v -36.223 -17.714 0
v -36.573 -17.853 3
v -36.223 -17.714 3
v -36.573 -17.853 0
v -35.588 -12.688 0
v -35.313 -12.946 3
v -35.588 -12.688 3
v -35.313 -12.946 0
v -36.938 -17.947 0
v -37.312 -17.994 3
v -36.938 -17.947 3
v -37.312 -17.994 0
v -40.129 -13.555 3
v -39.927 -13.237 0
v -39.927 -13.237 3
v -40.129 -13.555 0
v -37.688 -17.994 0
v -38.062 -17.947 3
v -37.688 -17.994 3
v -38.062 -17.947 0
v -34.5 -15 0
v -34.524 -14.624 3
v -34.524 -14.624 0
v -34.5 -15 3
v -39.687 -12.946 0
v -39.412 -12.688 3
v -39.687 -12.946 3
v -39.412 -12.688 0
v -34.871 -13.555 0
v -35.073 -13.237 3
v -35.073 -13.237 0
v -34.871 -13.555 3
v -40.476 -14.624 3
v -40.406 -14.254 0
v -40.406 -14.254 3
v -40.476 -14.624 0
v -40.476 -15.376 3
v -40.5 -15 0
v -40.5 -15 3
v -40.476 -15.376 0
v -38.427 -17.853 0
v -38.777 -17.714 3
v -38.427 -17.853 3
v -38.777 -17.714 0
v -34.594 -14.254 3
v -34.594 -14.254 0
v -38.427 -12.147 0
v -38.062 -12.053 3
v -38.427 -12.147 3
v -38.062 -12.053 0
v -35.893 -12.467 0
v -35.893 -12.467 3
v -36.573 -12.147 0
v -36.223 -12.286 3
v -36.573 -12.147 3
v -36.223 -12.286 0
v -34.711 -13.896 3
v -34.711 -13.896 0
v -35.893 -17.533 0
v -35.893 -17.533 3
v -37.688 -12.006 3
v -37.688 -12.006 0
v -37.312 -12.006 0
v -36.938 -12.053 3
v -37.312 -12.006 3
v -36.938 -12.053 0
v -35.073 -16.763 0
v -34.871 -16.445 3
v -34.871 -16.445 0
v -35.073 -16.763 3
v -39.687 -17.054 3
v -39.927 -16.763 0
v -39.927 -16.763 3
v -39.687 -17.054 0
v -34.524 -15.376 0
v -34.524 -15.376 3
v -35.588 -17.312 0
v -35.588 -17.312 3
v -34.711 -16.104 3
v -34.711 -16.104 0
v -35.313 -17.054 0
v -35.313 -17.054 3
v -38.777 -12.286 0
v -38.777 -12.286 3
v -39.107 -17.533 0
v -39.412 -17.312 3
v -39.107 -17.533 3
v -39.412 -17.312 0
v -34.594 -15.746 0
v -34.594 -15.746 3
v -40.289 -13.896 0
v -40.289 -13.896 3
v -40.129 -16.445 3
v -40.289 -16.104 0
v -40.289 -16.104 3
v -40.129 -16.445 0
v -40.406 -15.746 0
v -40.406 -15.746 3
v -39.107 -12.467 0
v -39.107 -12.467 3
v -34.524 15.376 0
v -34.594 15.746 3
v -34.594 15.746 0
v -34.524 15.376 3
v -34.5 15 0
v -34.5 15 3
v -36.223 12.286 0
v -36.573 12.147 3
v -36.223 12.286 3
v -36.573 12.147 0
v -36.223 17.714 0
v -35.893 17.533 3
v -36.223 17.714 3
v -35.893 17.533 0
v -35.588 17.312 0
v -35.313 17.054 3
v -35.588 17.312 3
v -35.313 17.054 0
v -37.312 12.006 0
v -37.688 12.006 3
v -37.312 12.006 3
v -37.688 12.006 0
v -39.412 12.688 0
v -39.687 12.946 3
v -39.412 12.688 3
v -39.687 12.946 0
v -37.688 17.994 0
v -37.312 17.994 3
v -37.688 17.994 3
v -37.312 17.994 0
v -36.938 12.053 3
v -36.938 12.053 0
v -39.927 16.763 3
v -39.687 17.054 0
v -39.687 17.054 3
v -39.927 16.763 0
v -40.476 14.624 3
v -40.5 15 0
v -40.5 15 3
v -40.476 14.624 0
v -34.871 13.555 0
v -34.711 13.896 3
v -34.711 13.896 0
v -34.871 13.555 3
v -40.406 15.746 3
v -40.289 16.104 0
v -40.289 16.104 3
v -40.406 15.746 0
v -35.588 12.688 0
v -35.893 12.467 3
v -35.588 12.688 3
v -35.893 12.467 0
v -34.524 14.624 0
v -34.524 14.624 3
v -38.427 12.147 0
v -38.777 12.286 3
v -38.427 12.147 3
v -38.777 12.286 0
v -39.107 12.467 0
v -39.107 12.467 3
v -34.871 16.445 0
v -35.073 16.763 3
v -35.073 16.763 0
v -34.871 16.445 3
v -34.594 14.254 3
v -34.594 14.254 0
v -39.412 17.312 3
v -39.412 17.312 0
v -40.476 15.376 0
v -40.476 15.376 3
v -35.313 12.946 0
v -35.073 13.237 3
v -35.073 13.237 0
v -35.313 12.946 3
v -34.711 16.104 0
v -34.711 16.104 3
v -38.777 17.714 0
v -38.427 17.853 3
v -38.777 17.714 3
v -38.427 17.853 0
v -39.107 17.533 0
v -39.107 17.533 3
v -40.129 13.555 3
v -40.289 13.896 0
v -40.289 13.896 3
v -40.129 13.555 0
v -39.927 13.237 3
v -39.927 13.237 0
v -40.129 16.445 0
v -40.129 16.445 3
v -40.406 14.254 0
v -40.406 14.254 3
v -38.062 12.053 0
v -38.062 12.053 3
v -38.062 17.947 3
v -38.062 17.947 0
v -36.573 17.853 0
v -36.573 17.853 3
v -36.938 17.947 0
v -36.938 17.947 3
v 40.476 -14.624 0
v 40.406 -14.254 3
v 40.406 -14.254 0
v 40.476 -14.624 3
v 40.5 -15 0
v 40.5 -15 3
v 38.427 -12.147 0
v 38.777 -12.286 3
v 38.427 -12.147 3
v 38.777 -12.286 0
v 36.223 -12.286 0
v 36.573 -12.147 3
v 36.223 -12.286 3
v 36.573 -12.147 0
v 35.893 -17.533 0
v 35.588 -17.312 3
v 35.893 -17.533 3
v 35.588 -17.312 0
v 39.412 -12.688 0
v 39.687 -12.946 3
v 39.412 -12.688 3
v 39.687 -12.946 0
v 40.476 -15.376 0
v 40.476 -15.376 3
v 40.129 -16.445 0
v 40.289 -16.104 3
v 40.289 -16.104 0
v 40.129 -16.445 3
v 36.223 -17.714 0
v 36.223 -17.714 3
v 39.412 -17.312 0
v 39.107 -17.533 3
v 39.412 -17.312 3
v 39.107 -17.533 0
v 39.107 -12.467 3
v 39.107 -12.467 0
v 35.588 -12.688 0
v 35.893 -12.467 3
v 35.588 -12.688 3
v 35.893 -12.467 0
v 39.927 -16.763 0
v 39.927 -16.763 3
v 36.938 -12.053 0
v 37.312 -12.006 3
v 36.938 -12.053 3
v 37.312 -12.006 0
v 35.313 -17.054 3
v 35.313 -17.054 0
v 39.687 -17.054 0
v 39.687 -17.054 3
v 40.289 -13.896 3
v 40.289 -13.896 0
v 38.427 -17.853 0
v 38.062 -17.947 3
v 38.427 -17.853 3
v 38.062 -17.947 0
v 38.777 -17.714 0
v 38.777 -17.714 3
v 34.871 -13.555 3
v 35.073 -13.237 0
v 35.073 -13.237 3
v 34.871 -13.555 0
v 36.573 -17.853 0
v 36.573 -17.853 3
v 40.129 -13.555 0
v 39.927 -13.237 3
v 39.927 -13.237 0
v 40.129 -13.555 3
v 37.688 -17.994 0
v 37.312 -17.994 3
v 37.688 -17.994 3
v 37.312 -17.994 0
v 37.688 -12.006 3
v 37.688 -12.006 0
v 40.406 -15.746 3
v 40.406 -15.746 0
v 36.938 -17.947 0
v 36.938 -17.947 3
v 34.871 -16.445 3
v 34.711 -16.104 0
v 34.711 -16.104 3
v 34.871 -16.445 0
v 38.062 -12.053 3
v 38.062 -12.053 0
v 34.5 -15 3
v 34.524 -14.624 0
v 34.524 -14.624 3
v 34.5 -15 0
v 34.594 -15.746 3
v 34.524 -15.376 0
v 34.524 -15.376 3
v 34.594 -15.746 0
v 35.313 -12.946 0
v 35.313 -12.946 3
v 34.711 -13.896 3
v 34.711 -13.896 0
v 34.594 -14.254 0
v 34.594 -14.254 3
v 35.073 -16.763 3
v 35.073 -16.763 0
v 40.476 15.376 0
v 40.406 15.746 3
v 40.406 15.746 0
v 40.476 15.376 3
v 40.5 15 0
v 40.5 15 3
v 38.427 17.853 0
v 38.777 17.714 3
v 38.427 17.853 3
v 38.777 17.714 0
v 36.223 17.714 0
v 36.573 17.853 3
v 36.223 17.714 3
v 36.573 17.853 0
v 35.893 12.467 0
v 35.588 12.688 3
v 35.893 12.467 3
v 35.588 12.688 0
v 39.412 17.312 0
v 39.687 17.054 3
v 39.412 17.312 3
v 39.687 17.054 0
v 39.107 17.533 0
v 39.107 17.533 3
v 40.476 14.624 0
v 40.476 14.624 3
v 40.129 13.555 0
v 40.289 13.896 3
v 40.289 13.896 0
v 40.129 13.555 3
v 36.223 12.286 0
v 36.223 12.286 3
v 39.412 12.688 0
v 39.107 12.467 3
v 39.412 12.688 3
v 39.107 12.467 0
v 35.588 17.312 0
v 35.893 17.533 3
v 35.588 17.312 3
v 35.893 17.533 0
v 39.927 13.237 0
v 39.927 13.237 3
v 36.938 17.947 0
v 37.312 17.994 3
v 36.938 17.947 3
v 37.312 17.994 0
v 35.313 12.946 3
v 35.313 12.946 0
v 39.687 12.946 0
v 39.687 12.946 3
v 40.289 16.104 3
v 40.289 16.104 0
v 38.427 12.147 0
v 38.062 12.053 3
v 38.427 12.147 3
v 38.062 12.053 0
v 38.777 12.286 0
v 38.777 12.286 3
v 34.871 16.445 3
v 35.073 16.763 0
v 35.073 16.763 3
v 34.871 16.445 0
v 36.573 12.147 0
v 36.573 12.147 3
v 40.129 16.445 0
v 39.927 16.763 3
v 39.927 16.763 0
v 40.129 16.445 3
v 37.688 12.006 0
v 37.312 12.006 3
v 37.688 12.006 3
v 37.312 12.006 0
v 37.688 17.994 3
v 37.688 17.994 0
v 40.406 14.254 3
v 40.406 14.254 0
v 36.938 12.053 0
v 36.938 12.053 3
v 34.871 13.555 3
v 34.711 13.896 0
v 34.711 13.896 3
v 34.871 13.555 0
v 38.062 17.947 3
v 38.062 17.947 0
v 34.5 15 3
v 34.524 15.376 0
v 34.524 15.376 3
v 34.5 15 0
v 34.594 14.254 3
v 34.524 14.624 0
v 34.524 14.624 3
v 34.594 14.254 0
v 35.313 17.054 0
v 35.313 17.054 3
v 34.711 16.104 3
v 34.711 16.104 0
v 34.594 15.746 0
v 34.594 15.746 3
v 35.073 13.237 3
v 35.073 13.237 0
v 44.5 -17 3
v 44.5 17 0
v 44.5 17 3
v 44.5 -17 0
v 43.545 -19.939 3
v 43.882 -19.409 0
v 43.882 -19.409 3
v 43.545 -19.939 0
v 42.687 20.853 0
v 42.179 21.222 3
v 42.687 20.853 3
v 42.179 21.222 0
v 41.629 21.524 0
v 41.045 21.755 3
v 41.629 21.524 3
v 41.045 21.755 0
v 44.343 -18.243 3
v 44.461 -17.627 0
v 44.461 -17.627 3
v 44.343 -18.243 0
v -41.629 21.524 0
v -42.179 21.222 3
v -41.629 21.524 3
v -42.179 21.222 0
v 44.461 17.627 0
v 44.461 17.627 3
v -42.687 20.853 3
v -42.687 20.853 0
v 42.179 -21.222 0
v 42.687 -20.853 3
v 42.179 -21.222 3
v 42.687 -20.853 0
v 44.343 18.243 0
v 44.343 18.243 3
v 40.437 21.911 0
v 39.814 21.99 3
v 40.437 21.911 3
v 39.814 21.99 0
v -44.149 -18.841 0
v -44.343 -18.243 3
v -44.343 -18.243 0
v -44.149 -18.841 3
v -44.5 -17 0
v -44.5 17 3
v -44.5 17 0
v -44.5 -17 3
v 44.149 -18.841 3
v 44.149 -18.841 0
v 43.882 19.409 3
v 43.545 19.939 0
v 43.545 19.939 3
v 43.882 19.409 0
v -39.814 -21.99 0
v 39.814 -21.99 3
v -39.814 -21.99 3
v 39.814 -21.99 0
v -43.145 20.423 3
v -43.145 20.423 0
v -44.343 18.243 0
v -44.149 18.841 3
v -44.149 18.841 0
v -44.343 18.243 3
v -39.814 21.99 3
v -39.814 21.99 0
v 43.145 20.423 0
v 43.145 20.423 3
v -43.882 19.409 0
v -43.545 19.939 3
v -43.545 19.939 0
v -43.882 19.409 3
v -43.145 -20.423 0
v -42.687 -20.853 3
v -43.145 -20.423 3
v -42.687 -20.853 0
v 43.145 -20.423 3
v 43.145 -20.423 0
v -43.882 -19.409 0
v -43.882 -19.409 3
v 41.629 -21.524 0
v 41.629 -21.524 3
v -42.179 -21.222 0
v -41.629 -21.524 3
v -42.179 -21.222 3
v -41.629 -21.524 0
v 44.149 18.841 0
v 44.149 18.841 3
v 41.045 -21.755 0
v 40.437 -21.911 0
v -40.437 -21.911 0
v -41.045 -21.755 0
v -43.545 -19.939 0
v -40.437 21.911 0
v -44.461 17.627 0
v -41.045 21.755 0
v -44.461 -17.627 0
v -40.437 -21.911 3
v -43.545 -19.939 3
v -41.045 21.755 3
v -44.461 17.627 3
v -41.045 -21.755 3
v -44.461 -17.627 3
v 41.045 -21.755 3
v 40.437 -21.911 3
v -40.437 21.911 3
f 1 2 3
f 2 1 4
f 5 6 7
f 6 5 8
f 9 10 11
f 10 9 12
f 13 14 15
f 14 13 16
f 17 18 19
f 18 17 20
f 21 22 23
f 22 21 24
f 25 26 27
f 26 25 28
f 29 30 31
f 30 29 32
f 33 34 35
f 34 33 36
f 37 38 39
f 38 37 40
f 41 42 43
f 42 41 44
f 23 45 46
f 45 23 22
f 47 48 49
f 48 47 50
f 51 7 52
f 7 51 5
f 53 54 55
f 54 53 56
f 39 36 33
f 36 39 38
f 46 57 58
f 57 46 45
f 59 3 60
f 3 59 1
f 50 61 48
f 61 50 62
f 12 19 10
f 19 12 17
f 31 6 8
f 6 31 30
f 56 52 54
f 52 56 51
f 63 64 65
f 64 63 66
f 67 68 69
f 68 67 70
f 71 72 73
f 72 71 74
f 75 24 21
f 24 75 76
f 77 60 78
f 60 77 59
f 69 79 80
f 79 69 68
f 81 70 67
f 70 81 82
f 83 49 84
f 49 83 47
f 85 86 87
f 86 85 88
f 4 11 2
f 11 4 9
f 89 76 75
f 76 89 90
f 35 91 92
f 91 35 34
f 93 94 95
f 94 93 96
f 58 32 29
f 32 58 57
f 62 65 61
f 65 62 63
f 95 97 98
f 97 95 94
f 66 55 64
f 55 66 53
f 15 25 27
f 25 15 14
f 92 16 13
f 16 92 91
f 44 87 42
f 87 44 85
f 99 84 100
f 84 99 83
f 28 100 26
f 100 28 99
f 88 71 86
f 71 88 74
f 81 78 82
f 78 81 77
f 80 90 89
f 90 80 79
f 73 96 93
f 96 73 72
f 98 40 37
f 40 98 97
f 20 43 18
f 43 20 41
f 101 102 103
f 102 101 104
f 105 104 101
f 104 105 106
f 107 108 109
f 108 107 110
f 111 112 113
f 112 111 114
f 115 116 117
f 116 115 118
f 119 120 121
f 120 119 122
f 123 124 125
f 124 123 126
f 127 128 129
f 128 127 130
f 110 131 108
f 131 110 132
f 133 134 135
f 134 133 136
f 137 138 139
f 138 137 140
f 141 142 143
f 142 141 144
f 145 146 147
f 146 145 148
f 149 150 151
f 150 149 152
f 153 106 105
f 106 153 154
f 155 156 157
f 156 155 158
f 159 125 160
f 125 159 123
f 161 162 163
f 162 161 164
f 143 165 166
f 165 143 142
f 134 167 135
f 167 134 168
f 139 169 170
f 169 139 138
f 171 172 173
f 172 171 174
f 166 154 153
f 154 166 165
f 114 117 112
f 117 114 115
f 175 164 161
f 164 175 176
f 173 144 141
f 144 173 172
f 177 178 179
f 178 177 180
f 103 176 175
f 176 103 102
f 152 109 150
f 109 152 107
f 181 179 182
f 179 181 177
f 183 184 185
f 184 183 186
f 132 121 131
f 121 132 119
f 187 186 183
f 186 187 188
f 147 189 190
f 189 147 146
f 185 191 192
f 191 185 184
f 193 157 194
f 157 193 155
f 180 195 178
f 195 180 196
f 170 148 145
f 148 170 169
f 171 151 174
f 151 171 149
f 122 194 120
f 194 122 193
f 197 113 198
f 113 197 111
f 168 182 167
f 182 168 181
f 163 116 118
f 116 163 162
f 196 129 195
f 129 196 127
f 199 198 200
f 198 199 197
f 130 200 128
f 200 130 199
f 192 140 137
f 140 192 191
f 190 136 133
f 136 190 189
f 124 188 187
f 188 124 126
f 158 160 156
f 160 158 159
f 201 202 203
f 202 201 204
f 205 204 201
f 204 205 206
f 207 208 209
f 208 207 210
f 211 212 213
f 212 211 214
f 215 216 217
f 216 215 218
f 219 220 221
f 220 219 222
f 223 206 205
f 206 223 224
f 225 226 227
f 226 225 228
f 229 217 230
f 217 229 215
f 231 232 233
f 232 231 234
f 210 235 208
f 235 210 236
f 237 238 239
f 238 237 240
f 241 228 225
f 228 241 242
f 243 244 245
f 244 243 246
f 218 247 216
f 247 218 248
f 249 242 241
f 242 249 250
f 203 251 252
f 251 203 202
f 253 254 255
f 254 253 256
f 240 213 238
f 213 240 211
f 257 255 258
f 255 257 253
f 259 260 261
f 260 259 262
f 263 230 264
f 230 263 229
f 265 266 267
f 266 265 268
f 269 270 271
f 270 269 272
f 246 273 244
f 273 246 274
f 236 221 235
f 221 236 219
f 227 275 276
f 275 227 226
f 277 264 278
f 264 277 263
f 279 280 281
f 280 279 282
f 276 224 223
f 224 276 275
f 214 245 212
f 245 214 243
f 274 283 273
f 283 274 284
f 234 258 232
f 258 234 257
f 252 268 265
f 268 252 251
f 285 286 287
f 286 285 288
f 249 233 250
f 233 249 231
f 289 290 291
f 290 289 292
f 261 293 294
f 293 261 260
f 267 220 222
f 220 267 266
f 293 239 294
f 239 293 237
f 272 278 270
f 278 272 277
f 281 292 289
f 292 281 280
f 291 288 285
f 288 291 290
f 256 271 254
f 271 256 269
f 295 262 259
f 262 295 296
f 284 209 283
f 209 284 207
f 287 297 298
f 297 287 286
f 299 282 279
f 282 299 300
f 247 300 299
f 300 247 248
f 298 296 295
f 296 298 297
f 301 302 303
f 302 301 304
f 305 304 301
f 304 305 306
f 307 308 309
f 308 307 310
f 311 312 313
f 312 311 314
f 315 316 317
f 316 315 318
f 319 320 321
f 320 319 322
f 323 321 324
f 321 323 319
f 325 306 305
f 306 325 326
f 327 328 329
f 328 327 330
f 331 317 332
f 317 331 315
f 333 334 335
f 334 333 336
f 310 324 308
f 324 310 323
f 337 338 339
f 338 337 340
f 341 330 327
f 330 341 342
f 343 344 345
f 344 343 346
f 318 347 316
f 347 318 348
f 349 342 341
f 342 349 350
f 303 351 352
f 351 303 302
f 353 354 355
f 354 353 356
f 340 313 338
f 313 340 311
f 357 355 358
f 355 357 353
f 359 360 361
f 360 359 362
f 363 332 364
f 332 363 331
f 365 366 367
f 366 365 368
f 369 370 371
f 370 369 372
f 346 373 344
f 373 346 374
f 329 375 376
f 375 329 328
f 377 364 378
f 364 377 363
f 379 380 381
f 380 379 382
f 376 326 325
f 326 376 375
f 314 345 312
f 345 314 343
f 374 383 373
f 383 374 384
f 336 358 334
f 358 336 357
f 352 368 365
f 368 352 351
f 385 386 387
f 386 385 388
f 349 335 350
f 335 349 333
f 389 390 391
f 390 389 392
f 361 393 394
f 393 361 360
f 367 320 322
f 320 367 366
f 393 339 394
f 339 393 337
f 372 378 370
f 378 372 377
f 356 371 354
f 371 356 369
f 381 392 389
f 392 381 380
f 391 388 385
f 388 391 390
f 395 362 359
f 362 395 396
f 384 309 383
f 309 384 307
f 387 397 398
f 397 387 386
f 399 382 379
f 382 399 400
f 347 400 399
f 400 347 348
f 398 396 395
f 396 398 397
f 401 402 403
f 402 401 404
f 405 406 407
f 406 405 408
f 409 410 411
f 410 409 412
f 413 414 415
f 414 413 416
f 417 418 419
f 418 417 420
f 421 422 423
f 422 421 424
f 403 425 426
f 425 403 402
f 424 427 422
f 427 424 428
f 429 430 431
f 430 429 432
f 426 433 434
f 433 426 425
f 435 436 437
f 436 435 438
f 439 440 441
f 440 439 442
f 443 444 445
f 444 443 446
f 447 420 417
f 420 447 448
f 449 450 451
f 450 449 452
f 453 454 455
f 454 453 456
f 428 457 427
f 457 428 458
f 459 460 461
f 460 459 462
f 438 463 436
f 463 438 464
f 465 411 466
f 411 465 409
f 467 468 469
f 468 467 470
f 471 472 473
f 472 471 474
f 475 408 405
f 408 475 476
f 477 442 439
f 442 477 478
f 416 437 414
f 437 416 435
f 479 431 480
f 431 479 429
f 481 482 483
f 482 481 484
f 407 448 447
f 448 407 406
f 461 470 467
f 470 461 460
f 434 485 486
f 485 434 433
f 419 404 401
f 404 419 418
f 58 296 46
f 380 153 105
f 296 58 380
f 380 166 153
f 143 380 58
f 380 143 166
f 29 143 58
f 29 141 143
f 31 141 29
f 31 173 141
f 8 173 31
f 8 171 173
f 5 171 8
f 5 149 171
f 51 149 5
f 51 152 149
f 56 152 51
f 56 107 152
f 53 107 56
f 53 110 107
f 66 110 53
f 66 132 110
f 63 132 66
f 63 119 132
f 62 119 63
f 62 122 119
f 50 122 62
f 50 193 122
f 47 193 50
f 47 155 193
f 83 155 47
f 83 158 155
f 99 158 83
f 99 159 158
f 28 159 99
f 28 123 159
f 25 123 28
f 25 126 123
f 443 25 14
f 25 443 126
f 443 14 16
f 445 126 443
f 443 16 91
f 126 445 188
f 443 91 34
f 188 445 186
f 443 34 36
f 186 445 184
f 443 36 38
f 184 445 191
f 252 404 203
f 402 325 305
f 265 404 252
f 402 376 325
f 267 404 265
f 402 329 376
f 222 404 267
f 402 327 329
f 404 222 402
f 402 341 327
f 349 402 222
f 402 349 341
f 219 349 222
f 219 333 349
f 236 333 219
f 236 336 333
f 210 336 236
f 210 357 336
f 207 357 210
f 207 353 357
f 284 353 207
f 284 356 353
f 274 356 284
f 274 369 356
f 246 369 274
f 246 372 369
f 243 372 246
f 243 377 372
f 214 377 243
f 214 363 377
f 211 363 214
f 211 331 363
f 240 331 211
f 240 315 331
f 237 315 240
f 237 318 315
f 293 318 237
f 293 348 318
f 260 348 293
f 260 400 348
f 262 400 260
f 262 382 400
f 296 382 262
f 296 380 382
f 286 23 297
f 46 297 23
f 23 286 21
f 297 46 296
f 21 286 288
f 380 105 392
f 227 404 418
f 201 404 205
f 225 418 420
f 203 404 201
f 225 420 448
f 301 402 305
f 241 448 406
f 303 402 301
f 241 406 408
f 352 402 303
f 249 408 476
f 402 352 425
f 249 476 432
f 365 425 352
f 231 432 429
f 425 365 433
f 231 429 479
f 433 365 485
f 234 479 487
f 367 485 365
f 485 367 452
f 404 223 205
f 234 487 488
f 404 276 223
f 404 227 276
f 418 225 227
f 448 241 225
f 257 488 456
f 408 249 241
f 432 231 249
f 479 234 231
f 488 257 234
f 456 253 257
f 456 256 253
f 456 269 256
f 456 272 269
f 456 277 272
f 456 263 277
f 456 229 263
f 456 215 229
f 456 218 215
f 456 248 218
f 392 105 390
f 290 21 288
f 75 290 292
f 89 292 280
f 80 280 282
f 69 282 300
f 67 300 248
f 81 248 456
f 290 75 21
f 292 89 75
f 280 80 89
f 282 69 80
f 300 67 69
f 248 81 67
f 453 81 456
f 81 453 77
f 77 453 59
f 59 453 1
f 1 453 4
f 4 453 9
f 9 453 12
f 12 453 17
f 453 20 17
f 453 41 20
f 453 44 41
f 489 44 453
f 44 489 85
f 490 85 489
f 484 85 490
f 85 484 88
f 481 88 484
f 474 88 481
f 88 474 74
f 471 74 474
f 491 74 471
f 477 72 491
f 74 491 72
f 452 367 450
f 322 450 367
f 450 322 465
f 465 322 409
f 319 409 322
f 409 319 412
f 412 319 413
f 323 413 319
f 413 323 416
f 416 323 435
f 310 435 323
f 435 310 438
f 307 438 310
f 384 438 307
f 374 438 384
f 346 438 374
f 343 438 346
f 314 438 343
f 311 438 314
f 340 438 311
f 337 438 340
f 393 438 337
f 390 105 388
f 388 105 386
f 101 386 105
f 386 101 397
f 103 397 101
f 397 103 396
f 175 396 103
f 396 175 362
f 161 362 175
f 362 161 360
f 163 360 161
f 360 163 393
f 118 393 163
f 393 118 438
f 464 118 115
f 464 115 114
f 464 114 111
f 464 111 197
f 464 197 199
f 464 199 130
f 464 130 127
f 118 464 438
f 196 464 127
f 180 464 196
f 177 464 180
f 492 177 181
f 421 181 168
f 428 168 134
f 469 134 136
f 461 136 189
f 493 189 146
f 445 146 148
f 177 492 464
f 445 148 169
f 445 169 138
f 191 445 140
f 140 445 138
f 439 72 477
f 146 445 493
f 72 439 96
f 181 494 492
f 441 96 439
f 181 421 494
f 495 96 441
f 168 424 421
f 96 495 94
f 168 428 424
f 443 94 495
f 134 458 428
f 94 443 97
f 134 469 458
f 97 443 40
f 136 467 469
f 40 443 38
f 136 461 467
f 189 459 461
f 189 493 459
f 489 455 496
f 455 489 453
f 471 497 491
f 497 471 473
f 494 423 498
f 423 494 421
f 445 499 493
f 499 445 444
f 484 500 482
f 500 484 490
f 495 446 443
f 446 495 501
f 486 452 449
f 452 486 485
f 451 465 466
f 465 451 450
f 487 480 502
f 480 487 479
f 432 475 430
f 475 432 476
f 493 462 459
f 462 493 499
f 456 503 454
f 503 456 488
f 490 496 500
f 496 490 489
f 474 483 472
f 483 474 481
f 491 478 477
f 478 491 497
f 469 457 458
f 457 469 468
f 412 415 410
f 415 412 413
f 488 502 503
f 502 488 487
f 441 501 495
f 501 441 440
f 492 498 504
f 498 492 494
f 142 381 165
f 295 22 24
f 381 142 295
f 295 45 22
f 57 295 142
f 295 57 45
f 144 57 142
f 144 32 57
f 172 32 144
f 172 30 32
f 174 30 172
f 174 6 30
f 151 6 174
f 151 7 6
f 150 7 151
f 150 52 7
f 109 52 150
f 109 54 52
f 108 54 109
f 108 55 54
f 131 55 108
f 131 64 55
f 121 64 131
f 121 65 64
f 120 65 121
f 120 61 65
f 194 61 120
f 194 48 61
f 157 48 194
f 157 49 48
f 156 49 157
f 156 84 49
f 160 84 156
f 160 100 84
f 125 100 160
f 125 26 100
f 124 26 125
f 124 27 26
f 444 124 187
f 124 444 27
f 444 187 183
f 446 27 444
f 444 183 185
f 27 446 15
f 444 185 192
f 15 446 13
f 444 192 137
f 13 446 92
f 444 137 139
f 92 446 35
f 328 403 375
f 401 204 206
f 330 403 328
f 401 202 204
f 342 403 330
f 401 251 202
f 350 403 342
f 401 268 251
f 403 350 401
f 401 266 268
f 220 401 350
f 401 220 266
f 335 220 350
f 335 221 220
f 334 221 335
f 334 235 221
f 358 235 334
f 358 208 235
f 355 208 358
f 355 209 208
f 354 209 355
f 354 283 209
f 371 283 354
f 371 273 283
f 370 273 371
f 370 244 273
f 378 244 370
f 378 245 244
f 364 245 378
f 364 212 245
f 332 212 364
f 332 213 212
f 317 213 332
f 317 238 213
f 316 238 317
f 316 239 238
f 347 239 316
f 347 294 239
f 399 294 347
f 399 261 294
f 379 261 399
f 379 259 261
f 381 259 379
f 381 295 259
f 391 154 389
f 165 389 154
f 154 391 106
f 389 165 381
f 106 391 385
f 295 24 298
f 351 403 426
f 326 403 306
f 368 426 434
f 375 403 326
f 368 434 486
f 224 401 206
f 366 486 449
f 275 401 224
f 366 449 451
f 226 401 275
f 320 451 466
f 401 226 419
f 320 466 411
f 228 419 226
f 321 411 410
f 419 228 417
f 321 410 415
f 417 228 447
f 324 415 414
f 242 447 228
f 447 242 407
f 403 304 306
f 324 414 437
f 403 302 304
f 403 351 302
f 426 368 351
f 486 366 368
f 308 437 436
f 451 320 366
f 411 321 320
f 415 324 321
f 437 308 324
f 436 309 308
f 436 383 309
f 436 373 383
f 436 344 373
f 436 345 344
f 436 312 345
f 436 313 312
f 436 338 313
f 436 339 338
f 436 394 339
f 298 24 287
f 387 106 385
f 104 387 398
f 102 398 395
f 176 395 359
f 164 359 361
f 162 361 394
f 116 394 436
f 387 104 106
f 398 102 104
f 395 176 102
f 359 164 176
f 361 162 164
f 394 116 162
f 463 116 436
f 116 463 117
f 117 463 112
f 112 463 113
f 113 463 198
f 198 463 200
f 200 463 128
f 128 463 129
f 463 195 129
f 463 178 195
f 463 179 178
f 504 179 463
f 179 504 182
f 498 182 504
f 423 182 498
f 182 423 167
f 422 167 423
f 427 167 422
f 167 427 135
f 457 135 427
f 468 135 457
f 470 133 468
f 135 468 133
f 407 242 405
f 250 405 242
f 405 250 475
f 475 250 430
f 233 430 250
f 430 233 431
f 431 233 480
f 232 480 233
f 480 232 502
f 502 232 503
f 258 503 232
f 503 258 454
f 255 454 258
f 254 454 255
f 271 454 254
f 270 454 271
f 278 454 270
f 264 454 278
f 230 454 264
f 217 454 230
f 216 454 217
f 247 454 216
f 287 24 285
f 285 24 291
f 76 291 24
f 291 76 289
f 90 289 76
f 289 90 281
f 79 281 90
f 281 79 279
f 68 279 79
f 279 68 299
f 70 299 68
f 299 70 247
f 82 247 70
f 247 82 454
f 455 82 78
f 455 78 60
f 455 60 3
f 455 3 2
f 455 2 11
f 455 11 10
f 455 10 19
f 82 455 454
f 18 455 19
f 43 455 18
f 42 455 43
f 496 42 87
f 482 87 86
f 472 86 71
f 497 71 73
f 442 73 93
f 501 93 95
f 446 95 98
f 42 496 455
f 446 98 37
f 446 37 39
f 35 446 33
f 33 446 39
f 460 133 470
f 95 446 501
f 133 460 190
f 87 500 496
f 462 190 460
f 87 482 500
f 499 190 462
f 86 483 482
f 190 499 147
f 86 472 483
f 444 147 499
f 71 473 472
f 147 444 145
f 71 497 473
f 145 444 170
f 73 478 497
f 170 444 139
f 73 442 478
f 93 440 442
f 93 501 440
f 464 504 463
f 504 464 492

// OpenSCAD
$fn = 50;


difference() {
	union() {
		hull() {
			translate(v = [-39.5000000000, 17.0000000000, 0]) {
				cylinder(h = 3, r = 5);
			}
			translate(v = [39.5000000000, 17.0000000000, 0]) {
				cylinder(h = 3, r = 5);
			}
			translate(v = [-39.5000000000, -17.0000000000, 0]) {
				cylinder(h = 3, r = 5);
			}
			translate(v = [39.5000000000, -17.0000000000, 0]) {
				cylinder(h = 3, r = 5);
			}
		}
	}
	union() {
		translate(v = [-37.5000000000, -15.0000000000, -100.0000000000]) {
			cylinder(h = 200, r = 3.0000000000);
		}
		translate(v = [-37.5000000000, 15.0000000000, -100.0000000000]) {
			cylinder(h = 200, r = 3.0000000000);
		}
		translate(v = [37.5000000000, -15.0000000000, -100.0000000000]) {
			cylinder(h = 200, r = 3.0000000000);
		}
		translate(v = [37.5000000000, 15.0000000000, -100.0000000000]) {
			cylinder(h = 200, r = 3.0000000000);
		}
	}
}
